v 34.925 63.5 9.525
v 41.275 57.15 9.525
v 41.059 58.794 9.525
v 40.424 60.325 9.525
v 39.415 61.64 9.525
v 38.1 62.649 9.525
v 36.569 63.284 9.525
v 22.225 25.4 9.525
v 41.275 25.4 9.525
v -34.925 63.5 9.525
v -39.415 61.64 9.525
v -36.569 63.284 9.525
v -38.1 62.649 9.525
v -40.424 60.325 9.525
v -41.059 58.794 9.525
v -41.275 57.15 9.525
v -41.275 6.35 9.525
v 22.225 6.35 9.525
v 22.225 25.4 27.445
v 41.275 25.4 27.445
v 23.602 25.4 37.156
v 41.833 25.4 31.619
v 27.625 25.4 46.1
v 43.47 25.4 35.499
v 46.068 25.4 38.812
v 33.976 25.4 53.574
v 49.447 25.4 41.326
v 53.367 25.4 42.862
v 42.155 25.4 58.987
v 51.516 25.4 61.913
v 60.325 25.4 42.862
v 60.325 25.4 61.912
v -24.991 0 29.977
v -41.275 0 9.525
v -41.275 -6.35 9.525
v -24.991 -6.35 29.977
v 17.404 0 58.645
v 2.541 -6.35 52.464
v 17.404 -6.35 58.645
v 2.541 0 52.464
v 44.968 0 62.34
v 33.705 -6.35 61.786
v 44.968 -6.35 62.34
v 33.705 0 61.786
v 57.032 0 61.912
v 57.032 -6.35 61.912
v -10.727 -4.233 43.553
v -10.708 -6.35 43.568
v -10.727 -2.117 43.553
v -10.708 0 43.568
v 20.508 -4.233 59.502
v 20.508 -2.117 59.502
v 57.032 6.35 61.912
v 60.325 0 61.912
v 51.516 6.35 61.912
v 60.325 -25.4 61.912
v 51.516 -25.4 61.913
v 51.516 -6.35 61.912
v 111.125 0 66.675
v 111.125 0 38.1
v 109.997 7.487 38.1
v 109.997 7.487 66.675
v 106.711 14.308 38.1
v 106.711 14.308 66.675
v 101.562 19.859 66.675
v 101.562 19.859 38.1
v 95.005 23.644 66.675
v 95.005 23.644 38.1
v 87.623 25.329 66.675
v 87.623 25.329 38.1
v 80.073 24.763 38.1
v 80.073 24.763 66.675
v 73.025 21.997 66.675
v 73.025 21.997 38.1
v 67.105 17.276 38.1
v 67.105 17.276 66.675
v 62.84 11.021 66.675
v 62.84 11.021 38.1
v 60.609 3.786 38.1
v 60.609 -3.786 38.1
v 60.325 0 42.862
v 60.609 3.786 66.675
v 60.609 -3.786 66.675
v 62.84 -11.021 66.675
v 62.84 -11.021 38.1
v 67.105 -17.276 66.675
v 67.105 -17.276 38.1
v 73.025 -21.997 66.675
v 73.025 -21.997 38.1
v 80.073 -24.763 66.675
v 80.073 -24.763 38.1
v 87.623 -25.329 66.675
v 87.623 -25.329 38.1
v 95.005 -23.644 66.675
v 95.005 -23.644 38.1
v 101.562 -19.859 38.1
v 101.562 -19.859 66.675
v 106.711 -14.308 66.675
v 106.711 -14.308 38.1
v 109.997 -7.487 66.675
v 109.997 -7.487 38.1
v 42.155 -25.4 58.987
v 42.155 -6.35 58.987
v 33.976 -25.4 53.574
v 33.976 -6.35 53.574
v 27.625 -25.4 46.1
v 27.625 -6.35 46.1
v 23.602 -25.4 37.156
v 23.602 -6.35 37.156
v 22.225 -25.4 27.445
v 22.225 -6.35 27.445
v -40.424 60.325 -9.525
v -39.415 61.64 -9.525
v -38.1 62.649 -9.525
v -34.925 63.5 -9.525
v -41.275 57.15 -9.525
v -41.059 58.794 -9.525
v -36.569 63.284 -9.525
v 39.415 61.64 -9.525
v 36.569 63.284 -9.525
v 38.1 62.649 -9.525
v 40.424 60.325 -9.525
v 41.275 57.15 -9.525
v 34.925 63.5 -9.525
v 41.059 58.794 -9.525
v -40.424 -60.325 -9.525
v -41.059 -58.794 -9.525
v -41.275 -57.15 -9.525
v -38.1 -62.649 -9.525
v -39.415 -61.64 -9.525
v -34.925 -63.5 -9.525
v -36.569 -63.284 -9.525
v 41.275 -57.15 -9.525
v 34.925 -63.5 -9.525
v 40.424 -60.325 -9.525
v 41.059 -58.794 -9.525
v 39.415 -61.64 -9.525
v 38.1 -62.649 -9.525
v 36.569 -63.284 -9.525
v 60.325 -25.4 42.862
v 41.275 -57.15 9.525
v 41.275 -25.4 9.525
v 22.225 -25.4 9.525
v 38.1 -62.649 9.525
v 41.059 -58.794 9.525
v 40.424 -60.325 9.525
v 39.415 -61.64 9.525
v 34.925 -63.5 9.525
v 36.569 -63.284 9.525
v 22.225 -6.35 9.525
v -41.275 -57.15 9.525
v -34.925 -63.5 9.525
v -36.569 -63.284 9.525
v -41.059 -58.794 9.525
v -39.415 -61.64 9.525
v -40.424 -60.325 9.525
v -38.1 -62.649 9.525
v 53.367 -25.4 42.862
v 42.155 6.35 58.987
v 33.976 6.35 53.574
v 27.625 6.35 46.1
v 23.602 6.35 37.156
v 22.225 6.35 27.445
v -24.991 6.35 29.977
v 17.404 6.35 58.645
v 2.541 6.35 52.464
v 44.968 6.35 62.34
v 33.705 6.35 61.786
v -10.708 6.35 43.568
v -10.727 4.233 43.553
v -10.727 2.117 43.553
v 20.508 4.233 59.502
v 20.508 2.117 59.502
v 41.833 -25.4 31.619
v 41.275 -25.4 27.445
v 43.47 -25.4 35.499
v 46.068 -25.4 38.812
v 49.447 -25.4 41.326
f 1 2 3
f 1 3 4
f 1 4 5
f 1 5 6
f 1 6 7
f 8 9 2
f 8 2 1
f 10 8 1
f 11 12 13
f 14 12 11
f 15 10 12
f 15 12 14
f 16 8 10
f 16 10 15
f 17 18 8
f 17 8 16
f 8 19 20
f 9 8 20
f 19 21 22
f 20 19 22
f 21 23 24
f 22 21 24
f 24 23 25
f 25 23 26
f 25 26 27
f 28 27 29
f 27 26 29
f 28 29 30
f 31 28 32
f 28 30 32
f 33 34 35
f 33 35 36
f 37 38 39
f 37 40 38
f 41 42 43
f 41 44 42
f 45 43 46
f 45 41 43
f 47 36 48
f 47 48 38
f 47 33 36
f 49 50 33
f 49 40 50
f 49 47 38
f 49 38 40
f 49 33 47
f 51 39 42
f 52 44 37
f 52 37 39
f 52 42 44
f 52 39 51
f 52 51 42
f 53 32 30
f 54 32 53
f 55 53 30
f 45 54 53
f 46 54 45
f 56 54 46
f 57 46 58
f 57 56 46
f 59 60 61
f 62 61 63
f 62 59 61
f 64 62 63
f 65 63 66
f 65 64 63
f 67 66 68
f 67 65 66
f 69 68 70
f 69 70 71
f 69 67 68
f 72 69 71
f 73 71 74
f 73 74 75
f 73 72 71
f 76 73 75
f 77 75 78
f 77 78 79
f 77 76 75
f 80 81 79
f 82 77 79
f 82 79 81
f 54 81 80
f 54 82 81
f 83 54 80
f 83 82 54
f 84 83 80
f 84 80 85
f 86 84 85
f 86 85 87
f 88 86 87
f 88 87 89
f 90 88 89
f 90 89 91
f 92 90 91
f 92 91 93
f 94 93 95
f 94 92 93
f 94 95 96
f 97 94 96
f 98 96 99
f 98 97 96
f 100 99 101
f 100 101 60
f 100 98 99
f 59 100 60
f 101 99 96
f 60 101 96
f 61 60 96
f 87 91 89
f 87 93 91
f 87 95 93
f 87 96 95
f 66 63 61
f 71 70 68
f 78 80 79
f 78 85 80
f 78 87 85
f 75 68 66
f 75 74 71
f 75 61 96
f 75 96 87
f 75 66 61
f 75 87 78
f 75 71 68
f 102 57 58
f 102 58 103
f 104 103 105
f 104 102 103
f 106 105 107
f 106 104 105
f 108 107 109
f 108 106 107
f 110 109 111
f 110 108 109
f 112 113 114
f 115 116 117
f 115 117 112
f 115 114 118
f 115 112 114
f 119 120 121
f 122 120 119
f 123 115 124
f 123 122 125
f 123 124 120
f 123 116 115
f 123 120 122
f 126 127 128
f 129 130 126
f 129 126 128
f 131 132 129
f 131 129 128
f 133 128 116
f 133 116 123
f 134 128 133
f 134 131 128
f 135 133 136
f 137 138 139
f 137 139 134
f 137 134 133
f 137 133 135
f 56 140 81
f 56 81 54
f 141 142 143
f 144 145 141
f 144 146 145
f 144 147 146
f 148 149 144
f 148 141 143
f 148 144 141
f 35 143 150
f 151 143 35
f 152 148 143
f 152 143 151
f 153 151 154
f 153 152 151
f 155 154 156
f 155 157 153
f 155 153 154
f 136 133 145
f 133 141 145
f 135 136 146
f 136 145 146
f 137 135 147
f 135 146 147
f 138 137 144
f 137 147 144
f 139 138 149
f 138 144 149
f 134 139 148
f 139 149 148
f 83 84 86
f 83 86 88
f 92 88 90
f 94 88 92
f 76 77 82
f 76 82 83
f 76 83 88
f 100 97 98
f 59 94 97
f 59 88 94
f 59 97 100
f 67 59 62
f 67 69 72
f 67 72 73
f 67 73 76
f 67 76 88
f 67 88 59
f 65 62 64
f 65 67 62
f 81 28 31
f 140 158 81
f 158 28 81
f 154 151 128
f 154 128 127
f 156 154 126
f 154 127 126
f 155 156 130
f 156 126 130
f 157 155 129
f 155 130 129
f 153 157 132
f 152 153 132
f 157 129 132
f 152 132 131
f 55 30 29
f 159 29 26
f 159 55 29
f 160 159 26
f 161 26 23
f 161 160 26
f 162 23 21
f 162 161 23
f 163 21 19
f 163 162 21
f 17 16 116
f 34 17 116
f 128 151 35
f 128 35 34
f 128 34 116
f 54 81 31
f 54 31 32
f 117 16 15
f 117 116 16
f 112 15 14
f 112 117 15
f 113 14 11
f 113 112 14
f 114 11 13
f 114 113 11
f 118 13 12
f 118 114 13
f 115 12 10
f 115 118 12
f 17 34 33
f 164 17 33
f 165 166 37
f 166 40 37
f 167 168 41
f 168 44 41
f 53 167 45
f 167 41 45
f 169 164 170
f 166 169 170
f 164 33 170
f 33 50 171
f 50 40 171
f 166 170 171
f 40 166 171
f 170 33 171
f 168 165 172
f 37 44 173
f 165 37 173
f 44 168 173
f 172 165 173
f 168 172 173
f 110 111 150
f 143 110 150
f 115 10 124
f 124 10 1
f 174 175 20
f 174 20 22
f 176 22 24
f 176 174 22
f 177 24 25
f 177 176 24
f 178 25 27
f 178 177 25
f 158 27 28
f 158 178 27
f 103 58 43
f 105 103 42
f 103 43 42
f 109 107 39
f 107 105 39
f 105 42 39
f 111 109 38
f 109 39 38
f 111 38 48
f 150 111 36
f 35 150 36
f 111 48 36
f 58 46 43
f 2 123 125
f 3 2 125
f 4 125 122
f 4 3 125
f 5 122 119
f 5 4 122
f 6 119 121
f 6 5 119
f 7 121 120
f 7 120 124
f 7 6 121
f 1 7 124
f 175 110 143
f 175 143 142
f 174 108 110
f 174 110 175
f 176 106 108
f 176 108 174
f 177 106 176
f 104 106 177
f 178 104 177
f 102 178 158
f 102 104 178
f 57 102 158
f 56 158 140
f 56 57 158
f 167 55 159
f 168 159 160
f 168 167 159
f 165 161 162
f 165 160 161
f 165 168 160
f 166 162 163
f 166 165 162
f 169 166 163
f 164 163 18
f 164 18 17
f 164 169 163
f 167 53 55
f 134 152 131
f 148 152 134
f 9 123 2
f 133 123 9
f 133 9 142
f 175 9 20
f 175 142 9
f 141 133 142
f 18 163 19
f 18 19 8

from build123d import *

# Parameters (mm, degrees)
F1_DEPTH = 63.5
F2_DEPTH = 25.4
F3_DEPTH = 6.35
F5_R     = 6.35


with BuildPart() as f1:
    # F0 (on Front) → F1 (new body, symmetric)
    with BuildSketch(Plane.XZ):
        Polygon((22.225, 9.525), (-41.275, 9.525), (-41.275, -9.525), (41.275, -9.525), (41.275, 9.525), align=None)
    extrude(amount=F1_DEPTH, both=True)

    # F0 (on Front) → F2 (join, symmetric)
    with BuildSketch(Plane.XZ):
        with BuildLine():
            Line((22.225, 27.444869), (22.225, 9.525))
            Line((22.225, 9.525), (41.275, 9.525))
            Line((41.275, 9.525), (41.275, 27.444869))
            ThreePointArc((41.275, 27.444869), (44.658538, 37.241756), (53.366843, 42.8625))
            Line((53.366843, 42.8625), (60.325, 42.8625))
            Line((60.325, 42.8625), (60.325, 61.9125))
            Line((60.325, 61.9125), (57.032458, 61.9125))
            Line((57.032458, 61.9125), (51.516348, 61.9125))
            ThreePointArc((51.516348, 61.9125), (30.536931, 50.061238), (22.225, 27.444869))
        make_face()
    extrude(amount=F2_DEPTH, both=True)

    # F0 (on Front) → F3 (join, symmetric)
    with BuildSketch(Plane.XZ):
        with BuildLine():
            add(Edge.make_bspline(
                [(-41.275, 9.525), (-9.536937, 54.105725), (16.330028, 64.756826), (57.032458, 61.9125)],
                knots=[0, 0, 0, 0, 111.394823, 111.394823, 111.394823, 111.394823], degree=3))
            Line((-41.275, 9.525), (22.225, 9.525))
            Line((22.225, 9.525), (22.225, 27.444869))
            ThreePointArc((22.225, 27.444869), (30.536931, 50.061238), (51.516348, 61.9125))
            Line((51.516348, 61.9125), (57.032458, 61.9125))
        make_face()
    extrude(amount=F3_DEPTH, both=True)

    # F0 (on Front) → F4 (revolve)
    with BuildSketch(Plane.XZ):
        Polygon((85.725, 66.675), (85.725, 61.9125), (85.725, 42.8625), (85.725, 38.1), (111.125, 38.1), (111.125, 66.675), align=None)
    revolve(axis=Axis((85.725, 0, 52.3875), (0, 0, 1)))

    # F5
    f5_edges = [f1.edges().sort_by_distance(p)[0] for p in [
        (41.275, -63.5, 0),
        (-41.275, -63.5, 0),
        (41.275, 63.5, 0),
        (-41.275, 63.5, 0),
    ]]
    fillet(f5_edges, radius=F5_R)


solid = f1.part
